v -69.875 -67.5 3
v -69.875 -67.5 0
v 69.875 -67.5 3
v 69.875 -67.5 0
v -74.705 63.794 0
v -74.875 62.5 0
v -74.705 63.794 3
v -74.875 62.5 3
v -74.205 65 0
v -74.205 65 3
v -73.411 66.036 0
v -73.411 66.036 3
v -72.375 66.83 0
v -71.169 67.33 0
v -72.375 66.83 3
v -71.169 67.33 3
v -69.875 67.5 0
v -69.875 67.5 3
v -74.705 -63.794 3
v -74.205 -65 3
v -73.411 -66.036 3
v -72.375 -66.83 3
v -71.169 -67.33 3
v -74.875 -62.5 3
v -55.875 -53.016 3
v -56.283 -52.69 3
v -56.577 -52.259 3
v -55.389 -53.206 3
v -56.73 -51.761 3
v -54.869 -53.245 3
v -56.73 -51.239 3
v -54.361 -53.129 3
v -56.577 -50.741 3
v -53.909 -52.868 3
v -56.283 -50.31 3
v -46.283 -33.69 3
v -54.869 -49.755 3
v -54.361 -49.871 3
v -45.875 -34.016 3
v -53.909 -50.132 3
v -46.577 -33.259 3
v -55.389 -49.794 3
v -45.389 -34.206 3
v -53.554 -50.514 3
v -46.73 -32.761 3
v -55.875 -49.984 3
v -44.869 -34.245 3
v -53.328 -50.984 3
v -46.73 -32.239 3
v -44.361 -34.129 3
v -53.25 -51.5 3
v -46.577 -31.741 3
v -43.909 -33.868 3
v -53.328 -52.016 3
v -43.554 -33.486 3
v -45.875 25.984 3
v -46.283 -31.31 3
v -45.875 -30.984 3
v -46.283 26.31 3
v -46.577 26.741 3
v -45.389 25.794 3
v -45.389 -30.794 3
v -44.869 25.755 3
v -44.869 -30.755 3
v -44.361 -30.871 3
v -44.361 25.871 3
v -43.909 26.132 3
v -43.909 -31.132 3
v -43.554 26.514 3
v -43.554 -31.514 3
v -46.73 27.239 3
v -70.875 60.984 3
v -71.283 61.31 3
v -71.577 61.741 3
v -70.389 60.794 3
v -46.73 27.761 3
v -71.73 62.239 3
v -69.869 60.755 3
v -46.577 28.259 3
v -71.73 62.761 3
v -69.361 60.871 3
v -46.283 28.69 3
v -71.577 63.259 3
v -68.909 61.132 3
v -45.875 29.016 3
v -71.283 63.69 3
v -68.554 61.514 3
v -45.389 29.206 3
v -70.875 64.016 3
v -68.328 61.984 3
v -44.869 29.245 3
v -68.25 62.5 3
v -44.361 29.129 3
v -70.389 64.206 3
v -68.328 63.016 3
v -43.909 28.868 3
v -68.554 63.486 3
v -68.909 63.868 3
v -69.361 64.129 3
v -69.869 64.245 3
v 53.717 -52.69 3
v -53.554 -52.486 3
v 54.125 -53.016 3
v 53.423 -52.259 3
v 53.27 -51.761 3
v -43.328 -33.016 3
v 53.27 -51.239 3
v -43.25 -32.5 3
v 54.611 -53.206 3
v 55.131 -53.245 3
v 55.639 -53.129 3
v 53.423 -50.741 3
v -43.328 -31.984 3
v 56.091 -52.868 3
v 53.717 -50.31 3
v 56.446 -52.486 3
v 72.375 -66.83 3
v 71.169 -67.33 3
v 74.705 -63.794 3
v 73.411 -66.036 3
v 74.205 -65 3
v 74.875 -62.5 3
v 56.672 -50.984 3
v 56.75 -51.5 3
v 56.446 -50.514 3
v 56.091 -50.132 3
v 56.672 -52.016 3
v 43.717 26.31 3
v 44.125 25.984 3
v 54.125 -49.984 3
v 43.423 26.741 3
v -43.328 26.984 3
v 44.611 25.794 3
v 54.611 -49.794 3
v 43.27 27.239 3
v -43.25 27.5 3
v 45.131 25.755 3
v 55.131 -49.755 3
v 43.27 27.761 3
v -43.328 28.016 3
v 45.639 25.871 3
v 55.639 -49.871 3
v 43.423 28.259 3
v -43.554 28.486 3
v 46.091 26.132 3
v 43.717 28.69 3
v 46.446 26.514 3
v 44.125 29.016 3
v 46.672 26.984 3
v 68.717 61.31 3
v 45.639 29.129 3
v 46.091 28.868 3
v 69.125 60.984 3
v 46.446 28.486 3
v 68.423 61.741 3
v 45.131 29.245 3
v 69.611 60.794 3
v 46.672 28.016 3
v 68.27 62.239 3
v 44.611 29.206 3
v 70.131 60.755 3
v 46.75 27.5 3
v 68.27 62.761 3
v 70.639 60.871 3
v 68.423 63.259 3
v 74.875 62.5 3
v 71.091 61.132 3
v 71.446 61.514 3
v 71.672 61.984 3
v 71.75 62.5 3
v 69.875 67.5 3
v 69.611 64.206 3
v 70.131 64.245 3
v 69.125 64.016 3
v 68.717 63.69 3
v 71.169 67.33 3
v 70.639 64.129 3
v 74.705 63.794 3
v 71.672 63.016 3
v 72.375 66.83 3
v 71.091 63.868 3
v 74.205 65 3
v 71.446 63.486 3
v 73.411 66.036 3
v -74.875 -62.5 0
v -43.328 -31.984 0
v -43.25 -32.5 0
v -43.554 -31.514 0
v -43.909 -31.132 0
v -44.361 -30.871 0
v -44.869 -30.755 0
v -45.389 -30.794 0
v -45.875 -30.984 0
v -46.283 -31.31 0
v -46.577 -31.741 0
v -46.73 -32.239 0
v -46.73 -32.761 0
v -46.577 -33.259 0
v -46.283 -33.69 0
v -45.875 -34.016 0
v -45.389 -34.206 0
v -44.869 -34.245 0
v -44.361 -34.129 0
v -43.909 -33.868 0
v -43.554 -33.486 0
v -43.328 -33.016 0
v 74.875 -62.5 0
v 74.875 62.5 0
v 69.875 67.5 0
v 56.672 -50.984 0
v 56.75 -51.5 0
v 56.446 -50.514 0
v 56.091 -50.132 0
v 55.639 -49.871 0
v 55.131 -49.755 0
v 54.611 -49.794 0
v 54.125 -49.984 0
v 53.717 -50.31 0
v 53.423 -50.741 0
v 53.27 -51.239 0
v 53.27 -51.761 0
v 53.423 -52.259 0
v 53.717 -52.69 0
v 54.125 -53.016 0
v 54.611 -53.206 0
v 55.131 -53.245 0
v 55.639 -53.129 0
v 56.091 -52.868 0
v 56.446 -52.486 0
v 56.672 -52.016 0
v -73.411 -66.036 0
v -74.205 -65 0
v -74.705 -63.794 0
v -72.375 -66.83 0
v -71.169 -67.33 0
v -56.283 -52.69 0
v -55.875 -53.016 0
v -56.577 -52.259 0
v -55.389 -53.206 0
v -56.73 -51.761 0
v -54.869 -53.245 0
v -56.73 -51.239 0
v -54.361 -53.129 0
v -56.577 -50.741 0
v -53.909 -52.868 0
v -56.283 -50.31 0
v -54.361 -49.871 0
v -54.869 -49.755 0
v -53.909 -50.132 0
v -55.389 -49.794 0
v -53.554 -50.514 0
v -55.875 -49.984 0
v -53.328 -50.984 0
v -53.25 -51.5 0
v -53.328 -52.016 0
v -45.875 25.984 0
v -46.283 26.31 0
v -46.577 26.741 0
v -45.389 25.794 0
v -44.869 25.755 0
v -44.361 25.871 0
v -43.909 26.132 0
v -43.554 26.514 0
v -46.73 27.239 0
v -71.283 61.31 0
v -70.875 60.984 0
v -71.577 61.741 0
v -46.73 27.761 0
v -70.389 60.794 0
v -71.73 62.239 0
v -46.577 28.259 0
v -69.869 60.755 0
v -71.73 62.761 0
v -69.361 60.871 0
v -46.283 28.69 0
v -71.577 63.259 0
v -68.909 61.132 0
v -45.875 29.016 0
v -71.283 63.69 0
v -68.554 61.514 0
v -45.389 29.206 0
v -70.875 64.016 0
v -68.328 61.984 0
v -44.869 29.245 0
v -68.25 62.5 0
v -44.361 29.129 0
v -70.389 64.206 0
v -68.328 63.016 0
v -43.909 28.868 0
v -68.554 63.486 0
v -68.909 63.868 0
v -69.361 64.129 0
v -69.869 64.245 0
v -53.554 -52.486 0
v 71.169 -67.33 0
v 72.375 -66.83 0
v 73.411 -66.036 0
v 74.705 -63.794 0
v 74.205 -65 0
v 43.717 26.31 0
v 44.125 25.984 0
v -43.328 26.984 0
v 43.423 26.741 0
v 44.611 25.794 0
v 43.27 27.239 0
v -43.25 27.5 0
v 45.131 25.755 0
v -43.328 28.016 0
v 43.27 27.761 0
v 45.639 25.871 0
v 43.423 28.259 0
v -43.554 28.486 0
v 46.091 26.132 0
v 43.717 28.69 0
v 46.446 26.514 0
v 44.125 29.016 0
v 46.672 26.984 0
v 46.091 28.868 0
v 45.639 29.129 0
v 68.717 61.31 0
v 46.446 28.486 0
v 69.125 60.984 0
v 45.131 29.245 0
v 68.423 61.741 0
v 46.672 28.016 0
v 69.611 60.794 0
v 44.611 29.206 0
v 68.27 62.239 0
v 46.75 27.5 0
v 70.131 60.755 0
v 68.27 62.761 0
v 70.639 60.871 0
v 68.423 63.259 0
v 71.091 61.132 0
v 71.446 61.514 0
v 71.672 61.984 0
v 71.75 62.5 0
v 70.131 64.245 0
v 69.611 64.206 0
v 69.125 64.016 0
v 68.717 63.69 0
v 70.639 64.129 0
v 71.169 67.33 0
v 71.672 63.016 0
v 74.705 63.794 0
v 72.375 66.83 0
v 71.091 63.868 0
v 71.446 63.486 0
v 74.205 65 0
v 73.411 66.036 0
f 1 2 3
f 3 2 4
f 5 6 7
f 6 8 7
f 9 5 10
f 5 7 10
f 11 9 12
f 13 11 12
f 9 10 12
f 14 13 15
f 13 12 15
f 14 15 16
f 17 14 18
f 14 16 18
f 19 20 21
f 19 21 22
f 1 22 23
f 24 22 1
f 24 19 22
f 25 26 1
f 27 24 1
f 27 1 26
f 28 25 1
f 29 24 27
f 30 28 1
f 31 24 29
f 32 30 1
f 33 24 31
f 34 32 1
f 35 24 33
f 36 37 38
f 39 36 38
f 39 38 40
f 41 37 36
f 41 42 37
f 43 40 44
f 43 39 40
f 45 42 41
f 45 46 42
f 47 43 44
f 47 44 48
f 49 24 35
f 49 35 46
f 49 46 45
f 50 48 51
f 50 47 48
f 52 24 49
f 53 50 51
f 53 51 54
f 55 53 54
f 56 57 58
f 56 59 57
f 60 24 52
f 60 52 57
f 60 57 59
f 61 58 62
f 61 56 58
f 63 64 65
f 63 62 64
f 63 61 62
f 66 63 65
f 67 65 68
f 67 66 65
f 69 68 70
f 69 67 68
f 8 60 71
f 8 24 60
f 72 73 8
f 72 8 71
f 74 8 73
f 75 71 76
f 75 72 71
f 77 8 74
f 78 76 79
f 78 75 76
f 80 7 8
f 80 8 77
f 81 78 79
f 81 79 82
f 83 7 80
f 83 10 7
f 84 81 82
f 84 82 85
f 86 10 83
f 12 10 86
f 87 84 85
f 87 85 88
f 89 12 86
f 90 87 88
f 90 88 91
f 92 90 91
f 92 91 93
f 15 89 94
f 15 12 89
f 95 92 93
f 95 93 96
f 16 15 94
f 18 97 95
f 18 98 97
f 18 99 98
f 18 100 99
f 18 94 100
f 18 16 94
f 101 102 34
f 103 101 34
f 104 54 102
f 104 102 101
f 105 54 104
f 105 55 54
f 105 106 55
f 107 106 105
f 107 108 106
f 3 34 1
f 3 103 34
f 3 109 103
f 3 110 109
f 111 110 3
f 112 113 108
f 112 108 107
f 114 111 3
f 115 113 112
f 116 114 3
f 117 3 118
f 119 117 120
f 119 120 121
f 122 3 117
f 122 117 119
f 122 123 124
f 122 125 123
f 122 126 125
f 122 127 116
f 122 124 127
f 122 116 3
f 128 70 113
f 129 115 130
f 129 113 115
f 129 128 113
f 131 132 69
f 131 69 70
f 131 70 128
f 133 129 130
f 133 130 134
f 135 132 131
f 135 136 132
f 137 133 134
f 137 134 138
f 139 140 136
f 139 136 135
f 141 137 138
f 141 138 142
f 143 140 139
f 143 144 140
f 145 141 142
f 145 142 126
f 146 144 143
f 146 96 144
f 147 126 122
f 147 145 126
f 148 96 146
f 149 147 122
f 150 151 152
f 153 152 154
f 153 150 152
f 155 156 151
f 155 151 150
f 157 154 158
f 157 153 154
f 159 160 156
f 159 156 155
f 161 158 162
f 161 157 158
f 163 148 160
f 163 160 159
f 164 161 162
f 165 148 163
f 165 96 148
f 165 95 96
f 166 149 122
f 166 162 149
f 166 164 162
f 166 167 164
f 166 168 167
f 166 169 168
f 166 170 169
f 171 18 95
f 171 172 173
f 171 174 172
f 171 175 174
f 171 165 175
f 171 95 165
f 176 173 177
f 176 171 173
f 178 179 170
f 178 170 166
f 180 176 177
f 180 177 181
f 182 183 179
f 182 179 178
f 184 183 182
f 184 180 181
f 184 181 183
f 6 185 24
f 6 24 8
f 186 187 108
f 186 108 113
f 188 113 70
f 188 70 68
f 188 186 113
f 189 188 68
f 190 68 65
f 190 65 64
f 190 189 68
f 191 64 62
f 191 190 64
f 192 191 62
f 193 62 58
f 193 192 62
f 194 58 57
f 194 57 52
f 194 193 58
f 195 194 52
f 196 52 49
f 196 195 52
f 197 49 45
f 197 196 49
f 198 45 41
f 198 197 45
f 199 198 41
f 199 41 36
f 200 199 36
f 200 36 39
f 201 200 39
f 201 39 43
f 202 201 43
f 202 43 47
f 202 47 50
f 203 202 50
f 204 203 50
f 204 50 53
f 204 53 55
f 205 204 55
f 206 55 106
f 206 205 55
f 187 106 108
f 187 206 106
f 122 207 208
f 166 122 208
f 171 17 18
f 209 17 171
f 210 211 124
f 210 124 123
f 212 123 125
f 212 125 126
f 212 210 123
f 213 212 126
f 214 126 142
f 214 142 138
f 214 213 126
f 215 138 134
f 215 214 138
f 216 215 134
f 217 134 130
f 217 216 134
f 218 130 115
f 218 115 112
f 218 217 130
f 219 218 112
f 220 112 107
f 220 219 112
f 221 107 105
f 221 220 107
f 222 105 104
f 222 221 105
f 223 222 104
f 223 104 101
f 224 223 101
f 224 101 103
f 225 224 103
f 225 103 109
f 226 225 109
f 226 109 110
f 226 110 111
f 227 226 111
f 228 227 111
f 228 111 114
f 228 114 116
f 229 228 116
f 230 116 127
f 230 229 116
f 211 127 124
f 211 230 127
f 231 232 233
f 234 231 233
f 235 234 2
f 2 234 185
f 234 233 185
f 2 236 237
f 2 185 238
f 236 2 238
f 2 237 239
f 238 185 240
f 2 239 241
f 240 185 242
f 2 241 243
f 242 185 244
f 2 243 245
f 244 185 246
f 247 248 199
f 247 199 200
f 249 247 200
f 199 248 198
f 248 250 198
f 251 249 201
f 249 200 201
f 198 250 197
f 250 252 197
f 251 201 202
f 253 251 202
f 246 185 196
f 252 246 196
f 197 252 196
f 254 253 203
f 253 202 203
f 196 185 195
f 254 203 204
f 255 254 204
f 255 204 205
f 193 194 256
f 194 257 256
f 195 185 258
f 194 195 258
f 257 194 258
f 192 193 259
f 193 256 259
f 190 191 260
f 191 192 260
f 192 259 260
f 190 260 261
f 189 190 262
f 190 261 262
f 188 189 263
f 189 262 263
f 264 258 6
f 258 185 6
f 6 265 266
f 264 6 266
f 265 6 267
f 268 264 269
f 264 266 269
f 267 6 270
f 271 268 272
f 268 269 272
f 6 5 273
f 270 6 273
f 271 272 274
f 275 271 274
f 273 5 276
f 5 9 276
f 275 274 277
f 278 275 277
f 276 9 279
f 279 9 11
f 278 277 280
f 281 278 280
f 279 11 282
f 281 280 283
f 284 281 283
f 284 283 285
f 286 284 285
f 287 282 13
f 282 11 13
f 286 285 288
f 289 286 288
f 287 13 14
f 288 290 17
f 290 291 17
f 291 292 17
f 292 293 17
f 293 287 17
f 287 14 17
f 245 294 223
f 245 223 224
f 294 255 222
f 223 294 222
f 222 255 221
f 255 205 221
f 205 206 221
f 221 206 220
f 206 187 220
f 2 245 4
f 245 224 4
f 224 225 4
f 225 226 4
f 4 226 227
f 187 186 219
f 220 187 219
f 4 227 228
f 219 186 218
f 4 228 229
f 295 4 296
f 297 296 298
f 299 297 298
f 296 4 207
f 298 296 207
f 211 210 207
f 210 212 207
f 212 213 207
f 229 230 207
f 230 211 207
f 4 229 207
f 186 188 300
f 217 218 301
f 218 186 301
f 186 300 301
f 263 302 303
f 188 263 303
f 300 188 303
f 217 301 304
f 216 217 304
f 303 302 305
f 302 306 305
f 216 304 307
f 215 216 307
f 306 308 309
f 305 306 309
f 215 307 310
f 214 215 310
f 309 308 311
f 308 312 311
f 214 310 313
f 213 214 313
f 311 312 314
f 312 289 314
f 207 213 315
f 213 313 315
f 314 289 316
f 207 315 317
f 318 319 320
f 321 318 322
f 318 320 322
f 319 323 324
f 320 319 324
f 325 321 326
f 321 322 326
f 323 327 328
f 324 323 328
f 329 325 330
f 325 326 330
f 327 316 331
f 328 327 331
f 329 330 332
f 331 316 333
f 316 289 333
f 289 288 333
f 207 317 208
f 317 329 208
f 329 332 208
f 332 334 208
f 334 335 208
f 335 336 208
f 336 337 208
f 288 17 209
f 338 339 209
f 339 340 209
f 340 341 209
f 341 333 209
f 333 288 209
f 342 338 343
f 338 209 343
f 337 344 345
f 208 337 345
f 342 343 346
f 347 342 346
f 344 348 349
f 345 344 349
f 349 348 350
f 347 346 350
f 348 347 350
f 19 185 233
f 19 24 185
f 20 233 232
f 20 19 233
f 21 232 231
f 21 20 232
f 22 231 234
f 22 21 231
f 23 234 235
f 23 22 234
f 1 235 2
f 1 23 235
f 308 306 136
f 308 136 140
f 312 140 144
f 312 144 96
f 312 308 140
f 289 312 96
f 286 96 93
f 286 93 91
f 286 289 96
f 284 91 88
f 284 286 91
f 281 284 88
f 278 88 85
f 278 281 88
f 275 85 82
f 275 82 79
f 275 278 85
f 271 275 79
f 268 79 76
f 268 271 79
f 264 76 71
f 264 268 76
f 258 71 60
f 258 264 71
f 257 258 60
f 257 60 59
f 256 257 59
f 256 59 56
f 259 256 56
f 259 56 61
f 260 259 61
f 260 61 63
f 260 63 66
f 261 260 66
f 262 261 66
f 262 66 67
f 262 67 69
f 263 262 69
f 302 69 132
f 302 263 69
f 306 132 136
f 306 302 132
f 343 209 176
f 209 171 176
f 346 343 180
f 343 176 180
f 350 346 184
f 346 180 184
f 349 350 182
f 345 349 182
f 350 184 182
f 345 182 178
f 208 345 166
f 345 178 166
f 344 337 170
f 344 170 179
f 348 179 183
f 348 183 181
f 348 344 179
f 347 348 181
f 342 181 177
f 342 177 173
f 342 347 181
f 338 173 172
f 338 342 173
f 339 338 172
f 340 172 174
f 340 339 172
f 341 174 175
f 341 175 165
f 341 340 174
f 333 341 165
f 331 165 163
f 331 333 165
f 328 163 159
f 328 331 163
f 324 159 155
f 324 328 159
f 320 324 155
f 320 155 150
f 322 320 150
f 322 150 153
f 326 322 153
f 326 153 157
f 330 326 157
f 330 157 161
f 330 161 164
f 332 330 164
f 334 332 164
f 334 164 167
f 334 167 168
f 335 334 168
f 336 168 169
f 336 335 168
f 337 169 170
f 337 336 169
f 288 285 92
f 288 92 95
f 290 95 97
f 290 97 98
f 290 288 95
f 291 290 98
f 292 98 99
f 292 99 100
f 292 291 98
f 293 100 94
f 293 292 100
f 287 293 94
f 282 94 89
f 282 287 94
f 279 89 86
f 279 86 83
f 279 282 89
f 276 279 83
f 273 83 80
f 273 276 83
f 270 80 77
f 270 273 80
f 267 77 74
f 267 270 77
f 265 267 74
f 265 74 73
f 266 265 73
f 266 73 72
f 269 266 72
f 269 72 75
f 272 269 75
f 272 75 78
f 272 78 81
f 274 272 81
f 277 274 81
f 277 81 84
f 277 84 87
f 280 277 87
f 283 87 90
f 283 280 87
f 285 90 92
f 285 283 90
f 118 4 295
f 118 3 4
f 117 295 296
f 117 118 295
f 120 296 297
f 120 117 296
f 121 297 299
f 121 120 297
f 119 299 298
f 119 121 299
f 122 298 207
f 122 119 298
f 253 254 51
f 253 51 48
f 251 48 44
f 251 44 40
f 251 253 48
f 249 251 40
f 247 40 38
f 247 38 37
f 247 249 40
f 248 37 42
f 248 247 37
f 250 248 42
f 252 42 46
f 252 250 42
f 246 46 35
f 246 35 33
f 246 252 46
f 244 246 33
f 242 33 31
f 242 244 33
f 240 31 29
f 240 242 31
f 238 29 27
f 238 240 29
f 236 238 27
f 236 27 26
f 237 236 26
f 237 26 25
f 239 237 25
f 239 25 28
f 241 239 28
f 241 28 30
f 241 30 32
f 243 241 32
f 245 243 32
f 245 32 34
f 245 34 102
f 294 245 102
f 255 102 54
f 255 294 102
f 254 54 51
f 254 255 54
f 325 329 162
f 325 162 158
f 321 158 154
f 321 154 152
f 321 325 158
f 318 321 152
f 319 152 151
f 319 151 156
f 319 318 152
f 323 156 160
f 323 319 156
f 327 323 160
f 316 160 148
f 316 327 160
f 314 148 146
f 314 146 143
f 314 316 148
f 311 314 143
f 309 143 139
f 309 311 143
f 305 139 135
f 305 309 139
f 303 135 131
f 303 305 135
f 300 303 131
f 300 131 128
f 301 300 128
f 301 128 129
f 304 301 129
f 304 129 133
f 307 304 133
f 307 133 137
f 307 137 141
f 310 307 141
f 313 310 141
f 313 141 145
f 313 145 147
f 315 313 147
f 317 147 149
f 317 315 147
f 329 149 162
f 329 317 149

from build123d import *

# Parameters (mm, degrees)
ESQUISSE1_W        = 149.75
ESQUISSE1_H        = 135
ESQUISSE1_R        = 1.75
BOSS_EXTRU_1_DEPTH = 3
CONG_1_R           = 5


with BuildPart() as part:
    # Esquisse1 → Boss.-Extru.1 (new body)
    with BuildSketch(Plane.XY):
        Rectangle(ESQUISSE1_W, ESQUISSE1_H)
        with Locations((-70, 62.5)):
            Circle(ESQUISSE1_R, mode=Mode.SUBTRACT)
        with Locations((70, 62.5)):
            Circle(ESQUISSE1_R, mode=Mode.SUBTRACT)
        with Locations((55, -51.5)):
            Circle(ESQUISSE1_R, mode=Mode.SUBTRACT)
        with Locations((-55, -51.5)):
            Circle(ESQUISSE1_R, mode=Mode.SUBTRACT)
        with Locations((45, 27.5)):
            Circle(ESQUISSE1_R, mode=Mode.SUBTRACT)
        with Locations((-45, 27.5)):
            Circle(ESQUISSE1_R, mode=Mode.SUBTRACT)
        with Locations((-45, -32.5)):
            Circle(ESQUISSE1_R, mode=Mode.SUBTRACT)
    extrude(amount=BOSS_EXTRU_1_DEPTH)

    # Congé1
    cong_1_edges = [part.edges().sort_by_distance(p)[0] for p in [
        (-74.875, 67.5, 1.5),
        (74.875, 67.5, 1.5),
        (74.875, -67.5, 1.5),
        (-74.875, -67.5, 1.5),
    ]]
    fillet(cong_1_edges, radius=CONG_1_R)


solid = part.part
